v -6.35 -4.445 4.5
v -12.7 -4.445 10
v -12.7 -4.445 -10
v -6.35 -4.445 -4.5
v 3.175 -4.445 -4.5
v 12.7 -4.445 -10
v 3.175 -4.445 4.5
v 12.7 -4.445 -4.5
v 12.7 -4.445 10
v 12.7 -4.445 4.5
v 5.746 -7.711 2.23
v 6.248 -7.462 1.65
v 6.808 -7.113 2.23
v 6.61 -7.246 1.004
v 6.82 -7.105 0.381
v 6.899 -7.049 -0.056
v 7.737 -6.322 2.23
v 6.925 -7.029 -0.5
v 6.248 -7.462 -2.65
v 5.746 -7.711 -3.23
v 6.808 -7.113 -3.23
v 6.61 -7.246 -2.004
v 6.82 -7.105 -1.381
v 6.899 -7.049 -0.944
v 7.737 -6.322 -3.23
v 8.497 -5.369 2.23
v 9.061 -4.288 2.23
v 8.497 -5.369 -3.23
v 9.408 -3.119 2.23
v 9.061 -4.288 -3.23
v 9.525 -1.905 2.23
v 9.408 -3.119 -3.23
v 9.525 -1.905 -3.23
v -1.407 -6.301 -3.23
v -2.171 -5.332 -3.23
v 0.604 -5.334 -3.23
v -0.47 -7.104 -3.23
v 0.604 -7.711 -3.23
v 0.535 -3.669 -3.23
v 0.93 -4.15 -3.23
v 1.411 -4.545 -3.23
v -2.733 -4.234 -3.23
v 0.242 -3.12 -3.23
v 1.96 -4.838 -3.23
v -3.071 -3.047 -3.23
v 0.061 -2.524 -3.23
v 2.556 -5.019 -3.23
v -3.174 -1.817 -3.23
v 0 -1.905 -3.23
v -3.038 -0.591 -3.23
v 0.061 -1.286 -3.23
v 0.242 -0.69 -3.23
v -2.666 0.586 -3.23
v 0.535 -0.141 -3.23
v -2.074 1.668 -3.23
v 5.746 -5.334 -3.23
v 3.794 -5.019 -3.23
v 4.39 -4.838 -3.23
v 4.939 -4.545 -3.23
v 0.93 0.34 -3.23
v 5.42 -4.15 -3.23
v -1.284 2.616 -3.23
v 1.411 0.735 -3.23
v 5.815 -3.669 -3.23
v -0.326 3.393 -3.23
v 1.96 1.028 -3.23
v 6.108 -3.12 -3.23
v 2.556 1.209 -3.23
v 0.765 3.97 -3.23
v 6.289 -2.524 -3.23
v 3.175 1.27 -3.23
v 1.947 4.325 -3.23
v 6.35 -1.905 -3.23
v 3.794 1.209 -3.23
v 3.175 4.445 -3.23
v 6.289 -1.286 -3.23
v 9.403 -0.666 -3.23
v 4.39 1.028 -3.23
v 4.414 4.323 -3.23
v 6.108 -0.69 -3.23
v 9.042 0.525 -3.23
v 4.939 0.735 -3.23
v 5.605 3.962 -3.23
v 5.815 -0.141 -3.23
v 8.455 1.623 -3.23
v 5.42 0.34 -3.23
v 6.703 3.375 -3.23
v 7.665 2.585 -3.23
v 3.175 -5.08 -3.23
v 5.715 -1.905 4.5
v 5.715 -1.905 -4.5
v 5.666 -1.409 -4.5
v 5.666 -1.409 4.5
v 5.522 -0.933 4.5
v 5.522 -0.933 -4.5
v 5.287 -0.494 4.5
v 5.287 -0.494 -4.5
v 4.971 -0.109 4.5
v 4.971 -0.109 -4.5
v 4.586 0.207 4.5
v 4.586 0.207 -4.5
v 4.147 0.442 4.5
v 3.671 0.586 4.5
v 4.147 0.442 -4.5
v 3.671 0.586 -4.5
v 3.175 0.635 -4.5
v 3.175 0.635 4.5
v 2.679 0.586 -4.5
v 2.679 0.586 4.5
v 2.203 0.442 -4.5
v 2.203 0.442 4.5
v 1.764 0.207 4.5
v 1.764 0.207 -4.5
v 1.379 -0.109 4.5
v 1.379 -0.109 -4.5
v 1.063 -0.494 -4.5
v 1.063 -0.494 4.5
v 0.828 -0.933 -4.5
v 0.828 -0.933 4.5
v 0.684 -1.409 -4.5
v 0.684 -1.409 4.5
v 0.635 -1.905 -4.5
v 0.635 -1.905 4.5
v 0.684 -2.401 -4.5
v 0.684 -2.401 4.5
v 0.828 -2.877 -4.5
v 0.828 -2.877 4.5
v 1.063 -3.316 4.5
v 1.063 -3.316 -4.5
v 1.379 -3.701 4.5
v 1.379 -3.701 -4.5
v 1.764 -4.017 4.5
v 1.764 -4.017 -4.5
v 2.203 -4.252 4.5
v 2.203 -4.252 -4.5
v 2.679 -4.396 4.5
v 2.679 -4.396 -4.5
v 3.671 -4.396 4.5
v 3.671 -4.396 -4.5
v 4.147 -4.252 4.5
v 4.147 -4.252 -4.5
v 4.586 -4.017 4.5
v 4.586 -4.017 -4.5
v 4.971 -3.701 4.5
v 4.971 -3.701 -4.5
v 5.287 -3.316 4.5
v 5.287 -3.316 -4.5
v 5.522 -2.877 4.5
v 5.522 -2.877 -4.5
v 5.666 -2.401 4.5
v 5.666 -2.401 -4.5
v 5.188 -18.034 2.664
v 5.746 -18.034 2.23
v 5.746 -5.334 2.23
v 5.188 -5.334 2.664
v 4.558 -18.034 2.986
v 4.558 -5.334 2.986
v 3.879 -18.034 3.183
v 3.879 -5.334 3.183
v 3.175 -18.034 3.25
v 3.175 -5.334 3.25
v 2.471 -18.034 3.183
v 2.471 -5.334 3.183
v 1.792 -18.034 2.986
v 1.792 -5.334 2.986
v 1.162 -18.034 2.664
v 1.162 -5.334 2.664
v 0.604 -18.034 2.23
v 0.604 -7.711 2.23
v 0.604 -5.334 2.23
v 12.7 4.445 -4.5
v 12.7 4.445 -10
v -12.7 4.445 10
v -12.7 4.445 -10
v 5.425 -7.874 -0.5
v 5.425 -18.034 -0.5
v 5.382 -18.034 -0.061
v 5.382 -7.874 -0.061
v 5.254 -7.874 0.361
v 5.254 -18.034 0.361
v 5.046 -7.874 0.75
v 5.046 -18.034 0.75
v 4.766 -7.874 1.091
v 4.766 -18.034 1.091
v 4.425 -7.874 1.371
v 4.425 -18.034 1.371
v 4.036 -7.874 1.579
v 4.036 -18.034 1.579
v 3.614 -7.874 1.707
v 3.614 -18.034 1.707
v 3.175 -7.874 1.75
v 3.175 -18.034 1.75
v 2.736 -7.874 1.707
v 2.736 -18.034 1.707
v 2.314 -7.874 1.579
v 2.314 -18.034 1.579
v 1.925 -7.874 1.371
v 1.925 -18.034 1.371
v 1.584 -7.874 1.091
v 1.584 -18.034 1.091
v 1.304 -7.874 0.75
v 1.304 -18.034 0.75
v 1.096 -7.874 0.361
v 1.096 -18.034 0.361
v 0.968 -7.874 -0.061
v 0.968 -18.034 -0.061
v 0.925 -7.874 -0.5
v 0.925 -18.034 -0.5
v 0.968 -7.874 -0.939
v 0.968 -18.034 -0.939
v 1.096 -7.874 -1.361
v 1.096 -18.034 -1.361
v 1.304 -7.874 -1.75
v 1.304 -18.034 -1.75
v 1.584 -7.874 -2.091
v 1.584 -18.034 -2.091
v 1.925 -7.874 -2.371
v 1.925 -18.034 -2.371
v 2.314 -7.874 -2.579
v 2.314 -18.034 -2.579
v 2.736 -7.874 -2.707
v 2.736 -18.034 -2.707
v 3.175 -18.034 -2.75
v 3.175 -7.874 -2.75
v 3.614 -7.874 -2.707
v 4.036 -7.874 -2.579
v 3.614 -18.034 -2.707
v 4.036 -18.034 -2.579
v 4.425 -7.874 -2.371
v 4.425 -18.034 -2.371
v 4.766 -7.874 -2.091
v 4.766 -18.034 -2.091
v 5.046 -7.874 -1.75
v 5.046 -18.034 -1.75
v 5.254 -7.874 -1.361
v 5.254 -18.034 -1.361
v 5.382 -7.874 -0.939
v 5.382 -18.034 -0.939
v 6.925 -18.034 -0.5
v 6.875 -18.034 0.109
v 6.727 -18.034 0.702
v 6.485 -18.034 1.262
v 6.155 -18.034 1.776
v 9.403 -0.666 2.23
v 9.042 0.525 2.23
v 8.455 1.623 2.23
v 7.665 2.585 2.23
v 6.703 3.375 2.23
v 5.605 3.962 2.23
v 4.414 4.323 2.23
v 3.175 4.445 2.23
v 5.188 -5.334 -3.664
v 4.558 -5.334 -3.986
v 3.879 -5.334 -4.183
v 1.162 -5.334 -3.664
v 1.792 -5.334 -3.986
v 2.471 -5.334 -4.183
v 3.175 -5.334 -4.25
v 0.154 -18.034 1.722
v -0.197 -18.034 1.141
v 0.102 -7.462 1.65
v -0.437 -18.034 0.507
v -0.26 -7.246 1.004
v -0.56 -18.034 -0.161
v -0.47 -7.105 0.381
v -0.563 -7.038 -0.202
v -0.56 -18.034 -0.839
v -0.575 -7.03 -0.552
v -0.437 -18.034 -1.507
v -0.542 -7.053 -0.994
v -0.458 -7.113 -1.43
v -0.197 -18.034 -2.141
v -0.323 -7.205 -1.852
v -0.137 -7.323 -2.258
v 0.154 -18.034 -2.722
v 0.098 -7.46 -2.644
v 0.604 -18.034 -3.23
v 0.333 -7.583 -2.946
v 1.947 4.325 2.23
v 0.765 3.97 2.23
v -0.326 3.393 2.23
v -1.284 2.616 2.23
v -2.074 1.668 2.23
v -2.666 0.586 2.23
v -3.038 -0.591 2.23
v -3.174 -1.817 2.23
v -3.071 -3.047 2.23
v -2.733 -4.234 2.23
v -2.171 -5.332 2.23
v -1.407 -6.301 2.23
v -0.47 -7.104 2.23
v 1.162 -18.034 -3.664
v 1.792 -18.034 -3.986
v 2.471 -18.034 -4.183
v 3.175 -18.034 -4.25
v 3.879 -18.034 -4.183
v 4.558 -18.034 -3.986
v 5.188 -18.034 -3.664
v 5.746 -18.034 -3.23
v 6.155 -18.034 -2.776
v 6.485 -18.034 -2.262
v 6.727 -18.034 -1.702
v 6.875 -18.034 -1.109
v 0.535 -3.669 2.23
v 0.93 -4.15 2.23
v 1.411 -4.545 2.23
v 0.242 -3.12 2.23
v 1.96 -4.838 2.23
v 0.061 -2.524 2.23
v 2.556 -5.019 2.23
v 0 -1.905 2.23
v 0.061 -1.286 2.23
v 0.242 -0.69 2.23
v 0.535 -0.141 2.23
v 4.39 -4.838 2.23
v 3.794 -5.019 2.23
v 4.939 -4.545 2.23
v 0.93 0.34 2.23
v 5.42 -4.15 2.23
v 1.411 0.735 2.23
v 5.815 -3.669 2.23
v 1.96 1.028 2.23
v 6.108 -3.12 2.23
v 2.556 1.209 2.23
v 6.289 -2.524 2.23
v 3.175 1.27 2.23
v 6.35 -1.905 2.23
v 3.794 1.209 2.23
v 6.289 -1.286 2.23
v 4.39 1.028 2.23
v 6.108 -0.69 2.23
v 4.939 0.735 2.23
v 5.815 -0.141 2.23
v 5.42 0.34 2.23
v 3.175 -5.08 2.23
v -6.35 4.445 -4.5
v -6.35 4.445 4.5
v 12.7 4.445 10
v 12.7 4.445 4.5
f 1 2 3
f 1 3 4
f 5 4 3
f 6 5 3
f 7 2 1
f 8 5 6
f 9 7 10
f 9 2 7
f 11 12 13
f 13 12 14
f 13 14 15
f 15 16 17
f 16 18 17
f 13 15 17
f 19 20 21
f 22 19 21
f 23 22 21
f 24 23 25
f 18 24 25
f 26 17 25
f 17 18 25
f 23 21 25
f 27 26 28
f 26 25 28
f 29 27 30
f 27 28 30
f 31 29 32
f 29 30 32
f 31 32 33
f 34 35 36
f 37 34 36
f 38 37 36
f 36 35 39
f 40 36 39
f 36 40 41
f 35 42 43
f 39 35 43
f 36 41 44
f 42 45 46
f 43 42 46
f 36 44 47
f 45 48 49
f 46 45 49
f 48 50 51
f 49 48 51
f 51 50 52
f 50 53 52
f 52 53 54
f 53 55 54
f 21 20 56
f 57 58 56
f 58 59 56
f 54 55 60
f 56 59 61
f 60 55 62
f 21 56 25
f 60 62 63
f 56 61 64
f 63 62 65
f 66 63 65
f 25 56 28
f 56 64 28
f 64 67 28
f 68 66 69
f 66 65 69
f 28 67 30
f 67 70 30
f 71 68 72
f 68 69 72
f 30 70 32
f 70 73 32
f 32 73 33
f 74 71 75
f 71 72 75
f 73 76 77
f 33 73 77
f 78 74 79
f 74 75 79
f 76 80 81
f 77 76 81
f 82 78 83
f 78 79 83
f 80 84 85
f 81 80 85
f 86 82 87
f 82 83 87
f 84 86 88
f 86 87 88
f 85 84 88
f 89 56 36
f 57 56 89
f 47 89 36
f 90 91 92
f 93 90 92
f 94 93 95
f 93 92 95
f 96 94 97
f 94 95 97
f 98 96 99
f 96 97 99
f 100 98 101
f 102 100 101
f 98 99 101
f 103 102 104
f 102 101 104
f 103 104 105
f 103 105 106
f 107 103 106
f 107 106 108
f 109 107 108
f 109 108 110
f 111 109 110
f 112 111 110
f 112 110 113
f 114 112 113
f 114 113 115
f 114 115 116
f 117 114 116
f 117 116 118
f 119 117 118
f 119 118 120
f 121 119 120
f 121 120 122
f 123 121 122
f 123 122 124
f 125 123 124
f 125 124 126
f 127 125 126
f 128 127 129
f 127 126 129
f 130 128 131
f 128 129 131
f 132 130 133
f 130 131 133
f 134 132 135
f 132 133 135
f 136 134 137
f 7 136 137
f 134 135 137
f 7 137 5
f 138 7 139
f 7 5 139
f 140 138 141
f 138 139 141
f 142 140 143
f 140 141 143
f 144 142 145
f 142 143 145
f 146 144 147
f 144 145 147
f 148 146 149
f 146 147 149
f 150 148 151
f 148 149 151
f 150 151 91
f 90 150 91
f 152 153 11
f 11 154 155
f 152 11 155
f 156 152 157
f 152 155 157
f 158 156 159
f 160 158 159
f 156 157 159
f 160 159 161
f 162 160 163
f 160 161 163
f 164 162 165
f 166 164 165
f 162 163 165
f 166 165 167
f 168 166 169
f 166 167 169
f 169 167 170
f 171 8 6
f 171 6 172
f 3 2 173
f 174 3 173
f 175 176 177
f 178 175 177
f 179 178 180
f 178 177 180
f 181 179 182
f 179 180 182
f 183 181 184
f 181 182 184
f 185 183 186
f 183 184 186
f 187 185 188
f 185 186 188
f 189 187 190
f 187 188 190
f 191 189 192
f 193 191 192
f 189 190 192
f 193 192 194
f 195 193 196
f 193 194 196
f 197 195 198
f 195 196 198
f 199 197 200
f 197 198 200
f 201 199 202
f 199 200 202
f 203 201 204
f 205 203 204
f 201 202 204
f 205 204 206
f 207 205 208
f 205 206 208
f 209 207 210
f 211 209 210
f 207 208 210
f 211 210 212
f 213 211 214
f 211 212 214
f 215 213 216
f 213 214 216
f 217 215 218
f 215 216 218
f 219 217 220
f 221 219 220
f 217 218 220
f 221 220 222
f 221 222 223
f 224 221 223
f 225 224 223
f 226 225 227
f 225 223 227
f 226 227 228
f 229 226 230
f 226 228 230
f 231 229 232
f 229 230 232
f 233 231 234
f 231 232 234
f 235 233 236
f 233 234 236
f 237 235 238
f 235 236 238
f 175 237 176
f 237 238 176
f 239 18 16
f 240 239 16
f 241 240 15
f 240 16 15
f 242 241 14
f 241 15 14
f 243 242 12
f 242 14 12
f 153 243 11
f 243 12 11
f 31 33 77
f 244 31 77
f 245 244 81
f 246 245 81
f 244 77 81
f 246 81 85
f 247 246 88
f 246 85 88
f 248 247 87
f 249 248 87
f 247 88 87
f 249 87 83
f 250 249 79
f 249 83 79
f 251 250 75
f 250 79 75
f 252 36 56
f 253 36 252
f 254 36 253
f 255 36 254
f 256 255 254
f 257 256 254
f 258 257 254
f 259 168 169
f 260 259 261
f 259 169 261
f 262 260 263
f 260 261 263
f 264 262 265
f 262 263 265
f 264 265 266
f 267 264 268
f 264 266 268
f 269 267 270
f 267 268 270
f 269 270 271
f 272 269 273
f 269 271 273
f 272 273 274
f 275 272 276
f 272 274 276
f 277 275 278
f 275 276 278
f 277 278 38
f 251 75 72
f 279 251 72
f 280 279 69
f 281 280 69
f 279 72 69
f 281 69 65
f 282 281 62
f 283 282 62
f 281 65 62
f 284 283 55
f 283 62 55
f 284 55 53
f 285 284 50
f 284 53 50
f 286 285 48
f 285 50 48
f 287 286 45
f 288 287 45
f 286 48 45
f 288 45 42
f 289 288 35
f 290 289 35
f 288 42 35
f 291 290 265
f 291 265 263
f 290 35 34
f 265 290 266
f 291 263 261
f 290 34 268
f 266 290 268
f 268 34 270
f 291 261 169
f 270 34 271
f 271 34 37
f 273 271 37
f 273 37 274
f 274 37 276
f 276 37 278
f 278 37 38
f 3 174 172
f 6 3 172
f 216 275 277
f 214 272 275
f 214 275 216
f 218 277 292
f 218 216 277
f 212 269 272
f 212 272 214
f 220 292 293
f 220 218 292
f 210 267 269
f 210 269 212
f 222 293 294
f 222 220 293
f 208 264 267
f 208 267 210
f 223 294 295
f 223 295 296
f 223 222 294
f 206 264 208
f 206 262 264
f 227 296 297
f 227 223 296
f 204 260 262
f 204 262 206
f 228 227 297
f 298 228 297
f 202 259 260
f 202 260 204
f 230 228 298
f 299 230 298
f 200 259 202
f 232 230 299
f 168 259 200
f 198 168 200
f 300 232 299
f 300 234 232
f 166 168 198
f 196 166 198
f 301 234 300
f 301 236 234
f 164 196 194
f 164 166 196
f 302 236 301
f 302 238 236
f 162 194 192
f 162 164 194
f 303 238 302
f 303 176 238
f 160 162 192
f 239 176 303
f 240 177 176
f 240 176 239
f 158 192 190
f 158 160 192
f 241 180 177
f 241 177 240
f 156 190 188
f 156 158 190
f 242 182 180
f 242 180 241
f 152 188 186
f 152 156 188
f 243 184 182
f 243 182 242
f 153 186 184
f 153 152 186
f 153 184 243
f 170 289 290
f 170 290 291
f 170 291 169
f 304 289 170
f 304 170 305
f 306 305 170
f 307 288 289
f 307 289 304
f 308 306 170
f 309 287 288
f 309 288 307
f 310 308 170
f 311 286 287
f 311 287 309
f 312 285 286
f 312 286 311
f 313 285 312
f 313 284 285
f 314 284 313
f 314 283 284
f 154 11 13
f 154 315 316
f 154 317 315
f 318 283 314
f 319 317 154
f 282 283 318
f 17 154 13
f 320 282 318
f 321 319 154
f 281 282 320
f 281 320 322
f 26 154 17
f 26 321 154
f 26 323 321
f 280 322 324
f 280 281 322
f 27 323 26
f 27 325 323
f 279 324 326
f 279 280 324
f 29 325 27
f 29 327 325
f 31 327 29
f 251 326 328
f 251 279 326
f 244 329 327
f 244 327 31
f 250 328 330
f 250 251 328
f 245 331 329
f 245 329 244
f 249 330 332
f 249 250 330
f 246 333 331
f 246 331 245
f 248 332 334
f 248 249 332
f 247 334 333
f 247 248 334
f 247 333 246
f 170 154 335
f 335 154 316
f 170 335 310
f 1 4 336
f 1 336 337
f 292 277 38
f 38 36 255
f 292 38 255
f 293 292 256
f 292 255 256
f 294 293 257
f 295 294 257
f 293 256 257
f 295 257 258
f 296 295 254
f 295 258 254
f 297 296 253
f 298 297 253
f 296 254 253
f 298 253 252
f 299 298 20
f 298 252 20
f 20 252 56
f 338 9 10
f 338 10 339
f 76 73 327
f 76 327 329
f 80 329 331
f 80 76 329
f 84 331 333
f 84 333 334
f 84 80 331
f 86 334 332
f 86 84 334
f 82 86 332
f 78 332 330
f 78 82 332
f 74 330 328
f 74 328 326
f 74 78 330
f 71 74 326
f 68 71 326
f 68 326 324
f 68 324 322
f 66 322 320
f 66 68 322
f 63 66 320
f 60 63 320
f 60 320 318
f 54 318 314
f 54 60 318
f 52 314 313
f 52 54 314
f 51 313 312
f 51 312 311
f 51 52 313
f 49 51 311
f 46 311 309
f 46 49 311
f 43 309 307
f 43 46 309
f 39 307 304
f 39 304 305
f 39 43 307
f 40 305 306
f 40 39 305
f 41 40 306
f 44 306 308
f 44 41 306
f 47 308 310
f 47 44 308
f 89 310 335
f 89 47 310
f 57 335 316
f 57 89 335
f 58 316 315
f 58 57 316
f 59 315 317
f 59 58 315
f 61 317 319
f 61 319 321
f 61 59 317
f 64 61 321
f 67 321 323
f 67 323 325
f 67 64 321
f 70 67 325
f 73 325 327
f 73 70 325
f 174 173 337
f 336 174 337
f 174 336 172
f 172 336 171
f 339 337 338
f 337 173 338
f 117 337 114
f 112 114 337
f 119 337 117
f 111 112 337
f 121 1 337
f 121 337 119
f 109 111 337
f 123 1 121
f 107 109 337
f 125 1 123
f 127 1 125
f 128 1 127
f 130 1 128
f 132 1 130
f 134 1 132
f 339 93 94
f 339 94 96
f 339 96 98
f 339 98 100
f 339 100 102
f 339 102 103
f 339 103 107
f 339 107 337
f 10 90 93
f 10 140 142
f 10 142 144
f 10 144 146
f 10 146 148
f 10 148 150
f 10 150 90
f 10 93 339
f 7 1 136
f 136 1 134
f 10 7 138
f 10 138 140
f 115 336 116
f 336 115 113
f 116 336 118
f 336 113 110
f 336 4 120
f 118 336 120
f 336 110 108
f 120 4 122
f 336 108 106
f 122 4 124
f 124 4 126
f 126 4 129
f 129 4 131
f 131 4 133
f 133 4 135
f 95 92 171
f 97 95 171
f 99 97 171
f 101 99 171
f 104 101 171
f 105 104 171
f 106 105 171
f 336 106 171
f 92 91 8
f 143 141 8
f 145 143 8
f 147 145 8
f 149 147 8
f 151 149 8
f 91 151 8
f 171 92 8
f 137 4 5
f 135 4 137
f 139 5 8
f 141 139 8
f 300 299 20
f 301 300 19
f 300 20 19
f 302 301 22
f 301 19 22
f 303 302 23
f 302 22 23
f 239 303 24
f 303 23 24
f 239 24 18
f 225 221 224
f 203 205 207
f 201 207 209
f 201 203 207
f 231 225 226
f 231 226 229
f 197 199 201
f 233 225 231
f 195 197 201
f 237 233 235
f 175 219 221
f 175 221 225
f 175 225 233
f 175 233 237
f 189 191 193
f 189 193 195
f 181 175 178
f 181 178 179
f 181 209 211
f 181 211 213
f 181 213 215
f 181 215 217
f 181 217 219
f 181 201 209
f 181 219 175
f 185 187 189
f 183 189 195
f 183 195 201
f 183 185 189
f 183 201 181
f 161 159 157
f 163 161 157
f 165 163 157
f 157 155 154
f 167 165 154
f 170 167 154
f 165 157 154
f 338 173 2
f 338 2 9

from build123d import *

# Parameters (mm, degrees)
F0_W      = 25.4
F0_H      = 8.89
F1_DEPTH  = 10
F2_W      = 19.05
F2_H      = 9
F3_DEPTH  = 8.891
F4_R      = 2.54
F5_DEPTH  = 9
F7_R      = 3.175
F8_DEPTH  = 5.46
F11_DEPTH = 12.7
F12_R     = 2.25
F13_DEPTH = 10.16


with BuildPart() as f1:
    # F0 (on Top) → F1 (new body, symmetric)
    with BuildSketch(Plane.XY):
        Rectangle(F0_W, F0_H)
    extrude(amount=F1_DEPTH, both=True)

    # F2 (on face) → F3 (cut, through all)
    with BuildSketch(Plane.XZ.offset(4.445)):
        with Locations((3.175, 0)):
            Rectangle(F2_W, F2_H)
    extrude(amount=-F3_DEPTH, mode=Mode.SUBTRACT)

    # F4 (on face) → F5 (join, through all)
    with BuildSketch(Plane.XY.offset(-4.5)):
        with Locations((3.175, -1.905)):
            Circle(F4_R)
    extrude(amount=F5_DEPTH)


with BuildPart() as f8:
    # F7 (on offset) → F8 (new body)
    with BuildSketch(Plane.XY.offset(-3.23)):
        with BuildLine():
            ThreePointArc((3.1750000069, 4.445), (-1.315128063, -6.3951280581), (9.525, -1.905))
            ThreePointArc((9.525, -1.905), (7.665128063, 2.5851280581), (3.1750000069, 4.445))
        make_face()
        with Locations((3.175, -1.905)):
            Circle(F7_R, mode=Mode.SUBTRACT)
    extrude(amount=F8_DEPTH)

    # F10 (on offset) → F11 (join)
    with BuildSketch(Plane.XZ.offset(5.334)):
        with BuildLine():
            ThreePointArc((0.6040857657, -3.23), (3.175, -4.25), (5.7459142343, -3.23))
            Line((5.7459142343, -3.23), (0.6040857657, -3.23))
        make_face()
        with BuildLine():
            Line((0.6040857657, -3.23), (5.7459142343, -3.23))
            ThreePointArc((5.7459142343, -3.23), (6.6176318696, -1.986871148), (6.925, -0.5))
            ThreePointArc((6.925, -0.5), (6.6176318696, 0.986871148), (5.7459142343, 2.23))
            Line((5.7459142343, 2.23), (0.6040857657, 2.23))
            ThreePointArc((0.6040857657, 2.23), (-0.575, -0.5), (0.6040857657, -3.23))
        make_face()
        with BuildLine():
            ThreePointArc((5.7459142343, 2.23), (3.175, 3.25), (0.6040857657, 2.23))
            Line((0.6040857657, 2.23), (5.7459142343, 2.23))
        make_face()
    extrude(amount=F11_DEPTH)

    # F12 (on face) → F13 (cut)
    with BuildSketch(Plane.XZ.offset(18.034)):
        with Locations((3.175, -0.5)):
            Circle(F12_R)
    extrude(amount=-F13_DEPTH, mode=Mode.SUBTRACT)


solid = Compound([f1.part, f8.part])
